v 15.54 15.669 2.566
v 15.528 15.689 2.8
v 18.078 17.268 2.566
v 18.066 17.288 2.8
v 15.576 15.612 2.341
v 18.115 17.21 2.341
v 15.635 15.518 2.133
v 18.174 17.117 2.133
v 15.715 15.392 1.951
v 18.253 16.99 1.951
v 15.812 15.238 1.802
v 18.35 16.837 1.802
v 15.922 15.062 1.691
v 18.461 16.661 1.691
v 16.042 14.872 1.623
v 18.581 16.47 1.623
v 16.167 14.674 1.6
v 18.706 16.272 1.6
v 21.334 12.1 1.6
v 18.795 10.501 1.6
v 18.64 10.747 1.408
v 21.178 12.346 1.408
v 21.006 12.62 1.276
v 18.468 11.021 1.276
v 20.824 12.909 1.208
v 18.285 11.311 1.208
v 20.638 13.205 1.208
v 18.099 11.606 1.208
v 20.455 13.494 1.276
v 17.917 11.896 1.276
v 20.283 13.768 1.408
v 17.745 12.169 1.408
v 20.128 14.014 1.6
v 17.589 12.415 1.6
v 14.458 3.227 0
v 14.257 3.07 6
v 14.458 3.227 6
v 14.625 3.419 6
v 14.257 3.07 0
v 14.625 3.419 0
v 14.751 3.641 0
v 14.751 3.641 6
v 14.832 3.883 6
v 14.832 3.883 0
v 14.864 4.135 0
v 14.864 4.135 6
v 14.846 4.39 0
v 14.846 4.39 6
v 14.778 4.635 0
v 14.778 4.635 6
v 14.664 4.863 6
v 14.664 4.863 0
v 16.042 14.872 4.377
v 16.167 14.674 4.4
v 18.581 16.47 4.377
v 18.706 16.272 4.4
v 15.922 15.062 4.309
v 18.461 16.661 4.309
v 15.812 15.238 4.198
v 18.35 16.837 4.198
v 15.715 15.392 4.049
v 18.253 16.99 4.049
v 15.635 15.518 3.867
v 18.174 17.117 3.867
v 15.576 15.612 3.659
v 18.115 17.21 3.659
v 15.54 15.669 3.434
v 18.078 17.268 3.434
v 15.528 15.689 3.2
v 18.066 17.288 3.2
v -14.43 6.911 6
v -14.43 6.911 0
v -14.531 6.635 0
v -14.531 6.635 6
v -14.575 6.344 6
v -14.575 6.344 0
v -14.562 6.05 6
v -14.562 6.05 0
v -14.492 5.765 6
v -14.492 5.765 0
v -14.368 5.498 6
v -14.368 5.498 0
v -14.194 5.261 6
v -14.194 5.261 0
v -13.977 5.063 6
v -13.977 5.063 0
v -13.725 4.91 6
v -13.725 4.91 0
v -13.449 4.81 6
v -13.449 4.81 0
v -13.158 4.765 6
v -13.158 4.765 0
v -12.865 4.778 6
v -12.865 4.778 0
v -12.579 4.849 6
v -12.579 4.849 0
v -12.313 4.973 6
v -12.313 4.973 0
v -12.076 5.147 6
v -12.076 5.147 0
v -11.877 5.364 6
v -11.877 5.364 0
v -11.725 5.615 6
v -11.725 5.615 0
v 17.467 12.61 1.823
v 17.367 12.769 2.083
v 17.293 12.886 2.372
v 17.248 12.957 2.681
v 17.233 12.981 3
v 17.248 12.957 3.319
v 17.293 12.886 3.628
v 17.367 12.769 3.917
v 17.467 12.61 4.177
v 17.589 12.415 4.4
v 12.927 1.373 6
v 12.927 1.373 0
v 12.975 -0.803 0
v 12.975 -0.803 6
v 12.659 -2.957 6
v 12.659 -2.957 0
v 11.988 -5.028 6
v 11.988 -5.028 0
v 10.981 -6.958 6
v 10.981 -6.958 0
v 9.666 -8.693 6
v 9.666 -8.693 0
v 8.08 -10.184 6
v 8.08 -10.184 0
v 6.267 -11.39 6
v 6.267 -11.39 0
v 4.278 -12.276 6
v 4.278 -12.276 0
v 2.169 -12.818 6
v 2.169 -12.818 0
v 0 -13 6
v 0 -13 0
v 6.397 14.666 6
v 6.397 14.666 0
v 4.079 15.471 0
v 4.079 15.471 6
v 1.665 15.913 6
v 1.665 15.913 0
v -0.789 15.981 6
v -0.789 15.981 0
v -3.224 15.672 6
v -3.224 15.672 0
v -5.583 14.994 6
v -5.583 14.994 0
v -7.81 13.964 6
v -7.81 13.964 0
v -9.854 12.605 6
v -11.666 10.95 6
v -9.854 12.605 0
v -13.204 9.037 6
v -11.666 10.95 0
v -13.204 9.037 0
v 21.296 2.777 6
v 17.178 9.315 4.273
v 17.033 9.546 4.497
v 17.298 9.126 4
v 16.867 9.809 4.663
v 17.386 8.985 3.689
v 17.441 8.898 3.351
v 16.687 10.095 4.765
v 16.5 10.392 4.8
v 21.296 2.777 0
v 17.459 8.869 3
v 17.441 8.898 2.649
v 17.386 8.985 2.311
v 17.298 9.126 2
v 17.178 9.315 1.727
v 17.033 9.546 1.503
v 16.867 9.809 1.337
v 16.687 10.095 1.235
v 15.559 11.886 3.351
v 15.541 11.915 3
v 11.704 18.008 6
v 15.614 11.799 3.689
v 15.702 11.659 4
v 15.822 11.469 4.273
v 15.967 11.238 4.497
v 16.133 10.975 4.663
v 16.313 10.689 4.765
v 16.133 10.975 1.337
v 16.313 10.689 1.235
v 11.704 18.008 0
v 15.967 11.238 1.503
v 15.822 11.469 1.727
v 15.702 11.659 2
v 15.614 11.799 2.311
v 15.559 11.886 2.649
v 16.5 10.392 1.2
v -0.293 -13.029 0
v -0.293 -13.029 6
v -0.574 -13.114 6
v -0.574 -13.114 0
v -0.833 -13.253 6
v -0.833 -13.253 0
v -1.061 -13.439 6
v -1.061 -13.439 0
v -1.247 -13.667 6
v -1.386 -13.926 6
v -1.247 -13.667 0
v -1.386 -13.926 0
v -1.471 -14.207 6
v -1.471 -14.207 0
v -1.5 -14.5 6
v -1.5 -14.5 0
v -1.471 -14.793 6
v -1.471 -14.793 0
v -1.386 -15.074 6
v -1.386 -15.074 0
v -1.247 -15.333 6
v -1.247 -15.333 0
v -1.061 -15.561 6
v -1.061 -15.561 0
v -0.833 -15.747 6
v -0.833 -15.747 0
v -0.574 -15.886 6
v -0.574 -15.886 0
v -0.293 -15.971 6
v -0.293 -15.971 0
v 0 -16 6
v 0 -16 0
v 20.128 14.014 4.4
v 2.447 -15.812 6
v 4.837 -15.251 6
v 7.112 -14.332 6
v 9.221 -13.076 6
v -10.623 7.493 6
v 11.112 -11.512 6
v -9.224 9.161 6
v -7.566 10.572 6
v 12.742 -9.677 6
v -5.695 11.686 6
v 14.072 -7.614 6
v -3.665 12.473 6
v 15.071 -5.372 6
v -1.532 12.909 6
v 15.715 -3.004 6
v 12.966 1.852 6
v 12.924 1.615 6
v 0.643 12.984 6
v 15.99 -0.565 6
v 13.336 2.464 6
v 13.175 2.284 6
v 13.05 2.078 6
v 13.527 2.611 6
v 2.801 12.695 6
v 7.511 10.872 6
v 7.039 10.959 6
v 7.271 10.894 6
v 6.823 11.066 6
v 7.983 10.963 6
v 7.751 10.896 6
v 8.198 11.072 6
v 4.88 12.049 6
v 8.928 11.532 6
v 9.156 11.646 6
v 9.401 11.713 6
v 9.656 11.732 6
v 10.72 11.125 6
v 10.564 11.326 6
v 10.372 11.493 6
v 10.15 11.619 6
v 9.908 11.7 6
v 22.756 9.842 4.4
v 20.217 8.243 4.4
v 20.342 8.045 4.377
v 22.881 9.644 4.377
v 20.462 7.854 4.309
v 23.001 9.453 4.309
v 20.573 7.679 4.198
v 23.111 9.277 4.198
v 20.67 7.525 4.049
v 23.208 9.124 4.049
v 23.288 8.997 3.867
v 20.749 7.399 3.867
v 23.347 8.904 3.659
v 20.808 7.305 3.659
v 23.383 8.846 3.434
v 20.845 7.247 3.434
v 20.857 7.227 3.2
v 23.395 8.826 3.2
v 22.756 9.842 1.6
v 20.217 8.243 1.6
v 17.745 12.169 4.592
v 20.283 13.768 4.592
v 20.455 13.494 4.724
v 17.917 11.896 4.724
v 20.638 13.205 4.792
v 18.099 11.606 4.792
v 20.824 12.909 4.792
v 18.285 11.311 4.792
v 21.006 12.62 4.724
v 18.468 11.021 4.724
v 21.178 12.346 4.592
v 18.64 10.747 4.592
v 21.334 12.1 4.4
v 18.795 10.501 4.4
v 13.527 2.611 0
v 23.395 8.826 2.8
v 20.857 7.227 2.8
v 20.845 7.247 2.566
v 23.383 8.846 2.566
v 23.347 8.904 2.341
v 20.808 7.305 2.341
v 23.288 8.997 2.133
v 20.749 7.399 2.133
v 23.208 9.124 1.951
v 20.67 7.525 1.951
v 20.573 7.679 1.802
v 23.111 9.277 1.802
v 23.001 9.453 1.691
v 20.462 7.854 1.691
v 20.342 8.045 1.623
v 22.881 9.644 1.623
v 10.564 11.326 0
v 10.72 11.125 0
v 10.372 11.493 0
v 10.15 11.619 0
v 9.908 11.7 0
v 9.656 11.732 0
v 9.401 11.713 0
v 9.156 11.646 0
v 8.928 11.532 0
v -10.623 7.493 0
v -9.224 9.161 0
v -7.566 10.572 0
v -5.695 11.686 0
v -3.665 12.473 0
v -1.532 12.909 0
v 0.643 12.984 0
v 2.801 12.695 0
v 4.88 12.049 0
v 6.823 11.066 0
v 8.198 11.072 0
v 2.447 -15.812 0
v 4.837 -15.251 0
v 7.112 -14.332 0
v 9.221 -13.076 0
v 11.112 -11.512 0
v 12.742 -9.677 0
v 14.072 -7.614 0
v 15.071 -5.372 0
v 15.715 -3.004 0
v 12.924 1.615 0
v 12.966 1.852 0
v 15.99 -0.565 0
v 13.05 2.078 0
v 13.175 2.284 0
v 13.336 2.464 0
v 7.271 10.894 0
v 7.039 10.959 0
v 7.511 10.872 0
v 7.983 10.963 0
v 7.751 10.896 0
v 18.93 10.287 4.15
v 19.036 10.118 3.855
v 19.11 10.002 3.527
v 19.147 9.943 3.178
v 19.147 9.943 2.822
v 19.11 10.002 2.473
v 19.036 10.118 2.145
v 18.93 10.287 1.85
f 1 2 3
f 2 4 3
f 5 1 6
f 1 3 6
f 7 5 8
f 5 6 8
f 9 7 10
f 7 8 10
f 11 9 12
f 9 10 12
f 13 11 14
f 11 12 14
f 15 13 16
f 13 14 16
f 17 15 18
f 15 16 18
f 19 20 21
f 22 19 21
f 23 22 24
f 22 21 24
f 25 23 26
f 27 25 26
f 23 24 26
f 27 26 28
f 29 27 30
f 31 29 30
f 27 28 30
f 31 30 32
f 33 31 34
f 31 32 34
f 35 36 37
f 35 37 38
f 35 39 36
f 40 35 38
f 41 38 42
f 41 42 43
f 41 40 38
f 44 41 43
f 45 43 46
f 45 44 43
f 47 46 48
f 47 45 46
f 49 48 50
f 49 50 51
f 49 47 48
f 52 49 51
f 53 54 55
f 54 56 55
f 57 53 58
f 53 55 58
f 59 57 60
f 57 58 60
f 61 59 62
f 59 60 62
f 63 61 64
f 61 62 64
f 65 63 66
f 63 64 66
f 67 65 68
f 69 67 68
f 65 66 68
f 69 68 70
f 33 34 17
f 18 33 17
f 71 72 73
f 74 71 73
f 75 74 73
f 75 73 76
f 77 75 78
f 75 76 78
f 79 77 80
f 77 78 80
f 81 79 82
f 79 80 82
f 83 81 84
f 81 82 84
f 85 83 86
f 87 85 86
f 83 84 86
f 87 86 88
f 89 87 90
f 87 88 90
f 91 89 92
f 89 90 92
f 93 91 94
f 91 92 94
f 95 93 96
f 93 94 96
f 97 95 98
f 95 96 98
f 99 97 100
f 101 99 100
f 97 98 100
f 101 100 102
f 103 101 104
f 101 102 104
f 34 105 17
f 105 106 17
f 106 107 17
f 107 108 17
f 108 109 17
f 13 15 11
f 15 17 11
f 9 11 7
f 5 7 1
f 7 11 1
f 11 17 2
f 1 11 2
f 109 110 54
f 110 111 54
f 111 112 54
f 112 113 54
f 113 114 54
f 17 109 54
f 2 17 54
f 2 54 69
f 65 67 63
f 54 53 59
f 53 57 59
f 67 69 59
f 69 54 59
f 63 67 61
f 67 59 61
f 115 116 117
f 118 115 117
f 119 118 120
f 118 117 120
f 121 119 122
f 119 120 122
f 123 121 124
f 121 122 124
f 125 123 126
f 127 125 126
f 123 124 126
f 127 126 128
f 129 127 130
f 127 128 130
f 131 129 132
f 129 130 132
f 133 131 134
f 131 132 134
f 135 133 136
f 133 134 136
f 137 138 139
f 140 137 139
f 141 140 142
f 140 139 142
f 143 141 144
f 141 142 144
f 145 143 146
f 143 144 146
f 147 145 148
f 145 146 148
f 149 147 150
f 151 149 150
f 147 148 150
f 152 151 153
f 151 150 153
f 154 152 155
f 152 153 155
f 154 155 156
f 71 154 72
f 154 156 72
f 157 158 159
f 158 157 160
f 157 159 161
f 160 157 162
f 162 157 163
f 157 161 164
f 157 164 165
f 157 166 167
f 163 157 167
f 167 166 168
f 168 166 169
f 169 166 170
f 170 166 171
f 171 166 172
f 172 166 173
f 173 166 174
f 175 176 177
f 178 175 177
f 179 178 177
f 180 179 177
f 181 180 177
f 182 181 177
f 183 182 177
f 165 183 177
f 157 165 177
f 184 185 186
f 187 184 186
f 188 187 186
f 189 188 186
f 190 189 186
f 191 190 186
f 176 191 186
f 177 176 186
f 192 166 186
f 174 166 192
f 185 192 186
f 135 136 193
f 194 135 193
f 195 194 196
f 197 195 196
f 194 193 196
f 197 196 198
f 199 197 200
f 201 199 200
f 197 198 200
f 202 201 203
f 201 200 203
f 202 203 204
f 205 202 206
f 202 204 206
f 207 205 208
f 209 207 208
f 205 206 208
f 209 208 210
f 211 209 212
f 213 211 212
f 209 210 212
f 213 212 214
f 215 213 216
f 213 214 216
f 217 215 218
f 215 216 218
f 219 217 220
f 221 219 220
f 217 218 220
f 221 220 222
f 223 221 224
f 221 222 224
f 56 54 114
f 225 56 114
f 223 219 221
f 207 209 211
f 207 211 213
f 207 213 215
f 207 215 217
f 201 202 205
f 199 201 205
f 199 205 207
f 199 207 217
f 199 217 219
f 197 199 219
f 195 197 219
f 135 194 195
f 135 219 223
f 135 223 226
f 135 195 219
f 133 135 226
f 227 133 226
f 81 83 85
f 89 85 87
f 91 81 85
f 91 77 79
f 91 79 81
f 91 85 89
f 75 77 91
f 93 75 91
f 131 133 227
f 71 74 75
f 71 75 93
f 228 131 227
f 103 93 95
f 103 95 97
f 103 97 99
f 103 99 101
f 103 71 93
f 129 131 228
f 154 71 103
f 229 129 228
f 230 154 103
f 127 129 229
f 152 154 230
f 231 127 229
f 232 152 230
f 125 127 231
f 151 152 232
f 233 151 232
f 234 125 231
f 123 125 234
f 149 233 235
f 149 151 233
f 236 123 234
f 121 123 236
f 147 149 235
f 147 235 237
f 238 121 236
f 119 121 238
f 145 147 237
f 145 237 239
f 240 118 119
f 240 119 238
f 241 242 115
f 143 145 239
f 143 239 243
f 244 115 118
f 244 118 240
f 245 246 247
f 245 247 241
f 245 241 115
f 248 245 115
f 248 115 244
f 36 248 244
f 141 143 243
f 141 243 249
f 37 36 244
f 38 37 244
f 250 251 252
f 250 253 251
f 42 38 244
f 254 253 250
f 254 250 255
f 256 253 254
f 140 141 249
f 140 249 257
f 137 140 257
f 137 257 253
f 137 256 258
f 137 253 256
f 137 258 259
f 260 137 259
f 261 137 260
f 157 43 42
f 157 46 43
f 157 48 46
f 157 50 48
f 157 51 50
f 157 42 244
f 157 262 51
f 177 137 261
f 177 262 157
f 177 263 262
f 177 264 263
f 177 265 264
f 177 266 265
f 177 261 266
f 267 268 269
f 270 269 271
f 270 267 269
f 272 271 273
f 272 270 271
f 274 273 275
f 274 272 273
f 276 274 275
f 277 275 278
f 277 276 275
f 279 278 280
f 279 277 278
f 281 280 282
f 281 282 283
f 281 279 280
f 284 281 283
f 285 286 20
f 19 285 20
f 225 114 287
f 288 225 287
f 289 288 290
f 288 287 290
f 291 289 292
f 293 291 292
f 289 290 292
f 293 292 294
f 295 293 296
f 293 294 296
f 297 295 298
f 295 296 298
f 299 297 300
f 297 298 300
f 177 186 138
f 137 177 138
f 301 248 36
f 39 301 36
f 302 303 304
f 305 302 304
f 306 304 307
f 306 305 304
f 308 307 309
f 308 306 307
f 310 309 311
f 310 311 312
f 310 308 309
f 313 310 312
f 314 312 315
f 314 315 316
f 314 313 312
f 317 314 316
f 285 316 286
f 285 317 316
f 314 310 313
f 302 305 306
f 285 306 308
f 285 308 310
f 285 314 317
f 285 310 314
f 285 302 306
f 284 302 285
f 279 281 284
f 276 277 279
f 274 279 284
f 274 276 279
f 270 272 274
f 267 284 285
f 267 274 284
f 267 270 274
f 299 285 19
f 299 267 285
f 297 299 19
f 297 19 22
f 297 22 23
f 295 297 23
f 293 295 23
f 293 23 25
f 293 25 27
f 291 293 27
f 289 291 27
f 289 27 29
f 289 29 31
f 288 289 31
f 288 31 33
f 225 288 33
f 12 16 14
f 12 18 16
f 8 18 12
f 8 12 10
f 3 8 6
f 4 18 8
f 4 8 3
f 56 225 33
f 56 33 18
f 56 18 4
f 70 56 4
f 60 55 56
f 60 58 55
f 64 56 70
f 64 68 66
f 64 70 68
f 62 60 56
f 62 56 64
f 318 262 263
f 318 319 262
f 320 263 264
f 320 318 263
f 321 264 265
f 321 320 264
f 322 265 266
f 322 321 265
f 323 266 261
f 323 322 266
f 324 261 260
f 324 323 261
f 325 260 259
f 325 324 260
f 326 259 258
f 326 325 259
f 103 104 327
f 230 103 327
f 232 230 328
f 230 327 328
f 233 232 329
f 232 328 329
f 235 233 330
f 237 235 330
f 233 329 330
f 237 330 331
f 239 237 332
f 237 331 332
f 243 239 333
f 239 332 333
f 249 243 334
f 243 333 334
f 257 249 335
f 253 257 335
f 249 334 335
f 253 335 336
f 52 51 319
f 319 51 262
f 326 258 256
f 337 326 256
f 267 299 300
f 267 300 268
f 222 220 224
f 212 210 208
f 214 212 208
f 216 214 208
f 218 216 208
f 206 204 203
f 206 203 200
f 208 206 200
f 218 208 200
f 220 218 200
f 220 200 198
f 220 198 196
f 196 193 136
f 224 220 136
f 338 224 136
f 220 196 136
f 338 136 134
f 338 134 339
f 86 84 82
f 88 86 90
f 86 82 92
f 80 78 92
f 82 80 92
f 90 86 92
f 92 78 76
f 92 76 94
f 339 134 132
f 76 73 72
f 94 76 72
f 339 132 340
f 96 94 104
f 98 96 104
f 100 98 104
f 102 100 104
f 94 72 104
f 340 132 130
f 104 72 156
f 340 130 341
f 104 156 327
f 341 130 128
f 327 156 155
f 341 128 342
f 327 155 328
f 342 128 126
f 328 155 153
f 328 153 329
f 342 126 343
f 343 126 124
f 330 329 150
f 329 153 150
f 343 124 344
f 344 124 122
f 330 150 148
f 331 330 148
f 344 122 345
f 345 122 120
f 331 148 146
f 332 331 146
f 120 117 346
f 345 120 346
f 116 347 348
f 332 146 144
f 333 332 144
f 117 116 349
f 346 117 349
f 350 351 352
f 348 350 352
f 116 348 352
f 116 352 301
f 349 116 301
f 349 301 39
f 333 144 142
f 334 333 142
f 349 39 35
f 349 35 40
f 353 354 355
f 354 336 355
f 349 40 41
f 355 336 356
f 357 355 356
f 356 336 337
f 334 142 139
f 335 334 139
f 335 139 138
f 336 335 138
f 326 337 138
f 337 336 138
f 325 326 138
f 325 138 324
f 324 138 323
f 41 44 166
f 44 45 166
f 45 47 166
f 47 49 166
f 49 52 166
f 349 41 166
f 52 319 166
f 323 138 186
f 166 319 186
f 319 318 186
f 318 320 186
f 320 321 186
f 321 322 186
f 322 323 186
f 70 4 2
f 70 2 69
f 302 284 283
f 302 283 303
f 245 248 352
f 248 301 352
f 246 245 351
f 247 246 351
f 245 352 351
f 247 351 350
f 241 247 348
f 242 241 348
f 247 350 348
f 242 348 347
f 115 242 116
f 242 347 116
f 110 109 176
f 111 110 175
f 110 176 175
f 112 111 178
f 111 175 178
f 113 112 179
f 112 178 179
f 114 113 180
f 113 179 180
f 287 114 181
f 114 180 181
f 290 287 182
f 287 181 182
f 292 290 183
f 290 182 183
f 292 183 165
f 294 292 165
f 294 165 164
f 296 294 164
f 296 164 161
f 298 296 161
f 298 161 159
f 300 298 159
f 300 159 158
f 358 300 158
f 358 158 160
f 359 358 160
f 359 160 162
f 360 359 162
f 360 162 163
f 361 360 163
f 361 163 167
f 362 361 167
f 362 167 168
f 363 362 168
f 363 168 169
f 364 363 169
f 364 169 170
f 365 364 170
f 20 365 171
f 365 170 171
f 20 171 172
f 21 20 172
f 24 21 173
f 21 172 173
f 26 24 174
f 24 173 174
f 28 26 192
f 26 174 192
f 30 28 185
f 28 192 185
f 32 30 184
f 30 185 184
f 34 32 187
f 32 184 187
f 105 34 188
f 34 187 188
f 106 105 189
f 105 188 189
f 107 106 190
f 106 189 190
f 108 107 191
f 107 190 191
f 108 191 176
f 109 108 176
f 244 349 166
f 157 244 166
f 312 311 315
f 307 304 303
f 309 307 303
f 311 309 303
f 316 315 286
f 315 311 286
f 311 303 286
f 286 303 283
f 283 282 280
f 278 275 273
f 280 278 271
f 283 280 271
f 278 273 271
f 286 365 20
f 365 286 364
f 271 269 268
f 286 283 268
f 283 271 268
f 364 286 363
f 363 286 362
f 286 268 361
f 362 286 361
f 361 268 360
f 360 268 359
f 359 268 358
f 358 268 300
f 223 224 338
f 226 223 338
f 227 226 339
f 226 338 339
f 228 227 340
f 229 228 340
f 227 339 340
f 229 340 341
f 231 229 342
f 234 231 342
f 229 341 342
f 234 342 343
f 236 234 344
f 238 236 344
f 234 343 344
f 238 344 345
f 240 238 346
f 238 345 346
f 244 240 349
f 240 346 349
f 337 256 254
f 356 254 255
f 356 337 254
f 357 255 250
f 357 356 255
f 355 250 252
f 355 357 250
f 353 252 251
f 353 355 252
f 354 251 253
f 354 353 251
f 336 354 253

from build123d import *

# Parameters (mm, degrees)
F1_DEPTH = 6
F2_R     = 1.8
F3_DEPTH = 2
F5_DEPTH = 3
F6_R     = 1.2
F8_DEPTH = 6.1
F9_R     = 1.3


# Not quite as in the source:
# - a feature names something its author has since deleted; it is built from what else it names


with BuildPart() as f1:
    # F0 (on Top) → F1 (new body)
    with BuildSketch(Plane.XY):
        with BuildLine():
            ThreePointArc((11, 6.9282032303), (11.3812706231, -6.2822511095), (0, -13))
            ThreePointArc((0, -13), (-1.5000000067, -14.4999999933), (-1.34e-08, -16))
            ThreePointArc((-1.34e-08, -16), (11.1120589721, -11.5118263277), (15.9900116293, -0.5652681616))
            Line((15.9900116293, -0.5652681616), (15.7964483902, -0.6871813851))
            Line((15.7964483902, -0.6871813851), (11, 6.9282032303))
        make_face()
        with BuildLine():
            ThreePointArc((-11.7246516205, 5.6153846154), (-0.7497687455, 12.9783607142), (11, 6.9282032303))
            Line((11, 6.9282032303), (6.2035516098, 14.5435878457))
            Line((6.2035516098, 14.5435878457), (6.3971148489, 14.6655010692))
            ThreePointArc((6.3971148489, 14.6655010692), (-5.582589802, 14.9944886909), (-14.4303404061, 6.9112427076))
            ThreePointArc((-14.4303404061, 6.9112427076), (-13.7254250594, 4.9104692687), (-11.7246516205, 5.6153846154))
        make_face()
        with BuildLine():
            Line((6.2035516098, 14.5435878457), (11, 6.9282032303))
            Line((11, 6.9282032303), (15.7964483902, -0.6871813851))
            Line((15.7964483902, -0.6871813851), (15.9900116293, -0.5652681616))
            ThreePointArc((15.9900116293, -0.5652681616), (13.5384615385, 8.5270193603), (6.3971148489, 14.6655010692))
            Line((6.3971148489, 14.6655010692), (6.2035516098, 14.5435878457))
        make_face()
        with BuildLine():
            ThreePointArc((6.3971148489, 14.6655010692), (13.5384615385, 8.5270193603), (15.9900116293, -0.5652681616))
            Line((15.9900116293, -0.5652681616), (21.2964483902, 2.77692023))
            Line((21.2964483902, 2.77692023), (11.7035516098, 18.0076894608))
            Line((11.7035516098, 18.0076894608), (6.3971148489, 14.6655010692))
        make_face()
    extrude(amount=F1_DEPTH)

    # F2 (on face) → F3 (join)
    with BuildSketch(Plane(origin=(16.5, 10.3923048454, 0), x_dir=(-0.53293871, 0.8461538462, 0), z_dir=(0.8461538462, 0.53293871, 0))):
        with Locations((0, 3)):
            Circle(F2_R)
    extrude(amount=F3_DEPTH)

    # F4 (on face) → F5 (join)
    with BuildSketch(Plane(origin=(18.1923076923, 11.4581822655, 0), x_dir=(-0.53293871, 0.8461538462, 0), z_dir=(0.8461538462, 0.53293871, 0))):
        with BuildLine():
            Line((-1.1313708499, 4.4), (1.1313708499, 4.4))
            ThreePointArc((1.1313708499, 4.4), (0, 4.8), (-1.1313708499, 4.4))
        make_face()
        with BuildLine():
            Line((-1.1313708499, 1.6), (1.1313708499, 1.6))
            ThreePointArc((1.1313708499, 1.6), (1.6242640687, 2.2242640687), (1.8, 3))
            ThreePointArc((1.8, 3), (1.6242640687, 3.7757359313), (1.1313708499, 4.4))
            Line((1.1313708499, 4.4), (-1.1313708499, 4.4))
            ThreePointArc((-1.1313708499, 4.4), (-1.8, 3), (-1.1313708499, 1.6))
        make_face()
        with BuildLine():
            Line((1.1313708499, 1.6), (5, 1.6))
            Line((5, 1.6), (5, 4.4))
            Line((5, 4.4), (1.1313708499, 4.4))
            ThreePointArc((1.1313708499, 4.4), (1.6242640687, 3.7757359313), (1.8, 3))
            ThreePointArc((1.8, 3), (1.6242640687, 2.2242640687), (1.1313708499, 1.6))
        make_face()
        with BuildLine():
            Line((-5, 1.6), (-1.1313708499, 1.6))
            ThreePointArc((-1.1313708499, 1.6), (-1.8, 3), (-1.1313708499, 4.4))
            Line((-1.1313708499, 4.4), (-5, 4.4))
            Line((-5, 4.4), (-5, 1.6))
        make_face()
        with BuildLine():
            ThreePointArc((-1.1313708499, 1.6), (0, 1.2), (1.1313708499, 1.6))
            Line((1.1313708499, 1.6), (-1.1313708499, 1.6))
        make_face()
    extrude(amount=F5_DEPTH)

    # F6
    f6_edges = [f1.edges().sort_by_distance(p)[0] for p in [
        (22.126232, 8.026821, 4.4),
        (22.126232, 8.026821, 1.6),
        (16.796845, 16.48836, 4.4),
        (16.796845, 16.48836, 1.6),
    ]]
    fillet(f6_edges, radius=F6_R)

    # F7 (on face) → F8 (cut)
    with BuildSketch(Plane.XY.offset(6)):
        with BuildLine():
            ThreePointArc((7.4891526037, 10.626033751), (9.4276549916, 8.9509396914), (11, 6.9282032303))
            Line((11, 6.9282032303), (12.6923076923, 7.9940806503))
            Line((12.6923076923, 7.9940806503), (10.0276141422, 12.2248498811))
            Line((10.0276141422, 12.2248498811), (7.4891526037, 10.626033751))
        make_face()
        with BuildLine():
            Line((12.6923076923, 7.9940806503), (11, 6.9282032303))
            ThreePointArc((11, 6.9282032303), (12.1451198736, 4.6363847183), (12.818539704, 2.1644952895))
            Line((12.818539704, 2.1644952895), (15.3570012424, 3.7633114195))
            Line((15.3570012424, 3.7633114195), (12.6923076923, 7.9940806503))
        make_face()
    extrude(amount=-F8_DEPTH, mode=Mode.SUBTRACT)

    # F9
    f9_edges = [f1.edges().sort_by_distance(p)[0] for p in [
        (7.489153, 10.626034, 3),
        (10.027614, 12.22485, 3),
        (12.81854, 2.164495, 3),
        (15.357001, 3.763311, 3),
    ]]
    fillet(f9_edges, radius=F9_R)


solid = f1.part
